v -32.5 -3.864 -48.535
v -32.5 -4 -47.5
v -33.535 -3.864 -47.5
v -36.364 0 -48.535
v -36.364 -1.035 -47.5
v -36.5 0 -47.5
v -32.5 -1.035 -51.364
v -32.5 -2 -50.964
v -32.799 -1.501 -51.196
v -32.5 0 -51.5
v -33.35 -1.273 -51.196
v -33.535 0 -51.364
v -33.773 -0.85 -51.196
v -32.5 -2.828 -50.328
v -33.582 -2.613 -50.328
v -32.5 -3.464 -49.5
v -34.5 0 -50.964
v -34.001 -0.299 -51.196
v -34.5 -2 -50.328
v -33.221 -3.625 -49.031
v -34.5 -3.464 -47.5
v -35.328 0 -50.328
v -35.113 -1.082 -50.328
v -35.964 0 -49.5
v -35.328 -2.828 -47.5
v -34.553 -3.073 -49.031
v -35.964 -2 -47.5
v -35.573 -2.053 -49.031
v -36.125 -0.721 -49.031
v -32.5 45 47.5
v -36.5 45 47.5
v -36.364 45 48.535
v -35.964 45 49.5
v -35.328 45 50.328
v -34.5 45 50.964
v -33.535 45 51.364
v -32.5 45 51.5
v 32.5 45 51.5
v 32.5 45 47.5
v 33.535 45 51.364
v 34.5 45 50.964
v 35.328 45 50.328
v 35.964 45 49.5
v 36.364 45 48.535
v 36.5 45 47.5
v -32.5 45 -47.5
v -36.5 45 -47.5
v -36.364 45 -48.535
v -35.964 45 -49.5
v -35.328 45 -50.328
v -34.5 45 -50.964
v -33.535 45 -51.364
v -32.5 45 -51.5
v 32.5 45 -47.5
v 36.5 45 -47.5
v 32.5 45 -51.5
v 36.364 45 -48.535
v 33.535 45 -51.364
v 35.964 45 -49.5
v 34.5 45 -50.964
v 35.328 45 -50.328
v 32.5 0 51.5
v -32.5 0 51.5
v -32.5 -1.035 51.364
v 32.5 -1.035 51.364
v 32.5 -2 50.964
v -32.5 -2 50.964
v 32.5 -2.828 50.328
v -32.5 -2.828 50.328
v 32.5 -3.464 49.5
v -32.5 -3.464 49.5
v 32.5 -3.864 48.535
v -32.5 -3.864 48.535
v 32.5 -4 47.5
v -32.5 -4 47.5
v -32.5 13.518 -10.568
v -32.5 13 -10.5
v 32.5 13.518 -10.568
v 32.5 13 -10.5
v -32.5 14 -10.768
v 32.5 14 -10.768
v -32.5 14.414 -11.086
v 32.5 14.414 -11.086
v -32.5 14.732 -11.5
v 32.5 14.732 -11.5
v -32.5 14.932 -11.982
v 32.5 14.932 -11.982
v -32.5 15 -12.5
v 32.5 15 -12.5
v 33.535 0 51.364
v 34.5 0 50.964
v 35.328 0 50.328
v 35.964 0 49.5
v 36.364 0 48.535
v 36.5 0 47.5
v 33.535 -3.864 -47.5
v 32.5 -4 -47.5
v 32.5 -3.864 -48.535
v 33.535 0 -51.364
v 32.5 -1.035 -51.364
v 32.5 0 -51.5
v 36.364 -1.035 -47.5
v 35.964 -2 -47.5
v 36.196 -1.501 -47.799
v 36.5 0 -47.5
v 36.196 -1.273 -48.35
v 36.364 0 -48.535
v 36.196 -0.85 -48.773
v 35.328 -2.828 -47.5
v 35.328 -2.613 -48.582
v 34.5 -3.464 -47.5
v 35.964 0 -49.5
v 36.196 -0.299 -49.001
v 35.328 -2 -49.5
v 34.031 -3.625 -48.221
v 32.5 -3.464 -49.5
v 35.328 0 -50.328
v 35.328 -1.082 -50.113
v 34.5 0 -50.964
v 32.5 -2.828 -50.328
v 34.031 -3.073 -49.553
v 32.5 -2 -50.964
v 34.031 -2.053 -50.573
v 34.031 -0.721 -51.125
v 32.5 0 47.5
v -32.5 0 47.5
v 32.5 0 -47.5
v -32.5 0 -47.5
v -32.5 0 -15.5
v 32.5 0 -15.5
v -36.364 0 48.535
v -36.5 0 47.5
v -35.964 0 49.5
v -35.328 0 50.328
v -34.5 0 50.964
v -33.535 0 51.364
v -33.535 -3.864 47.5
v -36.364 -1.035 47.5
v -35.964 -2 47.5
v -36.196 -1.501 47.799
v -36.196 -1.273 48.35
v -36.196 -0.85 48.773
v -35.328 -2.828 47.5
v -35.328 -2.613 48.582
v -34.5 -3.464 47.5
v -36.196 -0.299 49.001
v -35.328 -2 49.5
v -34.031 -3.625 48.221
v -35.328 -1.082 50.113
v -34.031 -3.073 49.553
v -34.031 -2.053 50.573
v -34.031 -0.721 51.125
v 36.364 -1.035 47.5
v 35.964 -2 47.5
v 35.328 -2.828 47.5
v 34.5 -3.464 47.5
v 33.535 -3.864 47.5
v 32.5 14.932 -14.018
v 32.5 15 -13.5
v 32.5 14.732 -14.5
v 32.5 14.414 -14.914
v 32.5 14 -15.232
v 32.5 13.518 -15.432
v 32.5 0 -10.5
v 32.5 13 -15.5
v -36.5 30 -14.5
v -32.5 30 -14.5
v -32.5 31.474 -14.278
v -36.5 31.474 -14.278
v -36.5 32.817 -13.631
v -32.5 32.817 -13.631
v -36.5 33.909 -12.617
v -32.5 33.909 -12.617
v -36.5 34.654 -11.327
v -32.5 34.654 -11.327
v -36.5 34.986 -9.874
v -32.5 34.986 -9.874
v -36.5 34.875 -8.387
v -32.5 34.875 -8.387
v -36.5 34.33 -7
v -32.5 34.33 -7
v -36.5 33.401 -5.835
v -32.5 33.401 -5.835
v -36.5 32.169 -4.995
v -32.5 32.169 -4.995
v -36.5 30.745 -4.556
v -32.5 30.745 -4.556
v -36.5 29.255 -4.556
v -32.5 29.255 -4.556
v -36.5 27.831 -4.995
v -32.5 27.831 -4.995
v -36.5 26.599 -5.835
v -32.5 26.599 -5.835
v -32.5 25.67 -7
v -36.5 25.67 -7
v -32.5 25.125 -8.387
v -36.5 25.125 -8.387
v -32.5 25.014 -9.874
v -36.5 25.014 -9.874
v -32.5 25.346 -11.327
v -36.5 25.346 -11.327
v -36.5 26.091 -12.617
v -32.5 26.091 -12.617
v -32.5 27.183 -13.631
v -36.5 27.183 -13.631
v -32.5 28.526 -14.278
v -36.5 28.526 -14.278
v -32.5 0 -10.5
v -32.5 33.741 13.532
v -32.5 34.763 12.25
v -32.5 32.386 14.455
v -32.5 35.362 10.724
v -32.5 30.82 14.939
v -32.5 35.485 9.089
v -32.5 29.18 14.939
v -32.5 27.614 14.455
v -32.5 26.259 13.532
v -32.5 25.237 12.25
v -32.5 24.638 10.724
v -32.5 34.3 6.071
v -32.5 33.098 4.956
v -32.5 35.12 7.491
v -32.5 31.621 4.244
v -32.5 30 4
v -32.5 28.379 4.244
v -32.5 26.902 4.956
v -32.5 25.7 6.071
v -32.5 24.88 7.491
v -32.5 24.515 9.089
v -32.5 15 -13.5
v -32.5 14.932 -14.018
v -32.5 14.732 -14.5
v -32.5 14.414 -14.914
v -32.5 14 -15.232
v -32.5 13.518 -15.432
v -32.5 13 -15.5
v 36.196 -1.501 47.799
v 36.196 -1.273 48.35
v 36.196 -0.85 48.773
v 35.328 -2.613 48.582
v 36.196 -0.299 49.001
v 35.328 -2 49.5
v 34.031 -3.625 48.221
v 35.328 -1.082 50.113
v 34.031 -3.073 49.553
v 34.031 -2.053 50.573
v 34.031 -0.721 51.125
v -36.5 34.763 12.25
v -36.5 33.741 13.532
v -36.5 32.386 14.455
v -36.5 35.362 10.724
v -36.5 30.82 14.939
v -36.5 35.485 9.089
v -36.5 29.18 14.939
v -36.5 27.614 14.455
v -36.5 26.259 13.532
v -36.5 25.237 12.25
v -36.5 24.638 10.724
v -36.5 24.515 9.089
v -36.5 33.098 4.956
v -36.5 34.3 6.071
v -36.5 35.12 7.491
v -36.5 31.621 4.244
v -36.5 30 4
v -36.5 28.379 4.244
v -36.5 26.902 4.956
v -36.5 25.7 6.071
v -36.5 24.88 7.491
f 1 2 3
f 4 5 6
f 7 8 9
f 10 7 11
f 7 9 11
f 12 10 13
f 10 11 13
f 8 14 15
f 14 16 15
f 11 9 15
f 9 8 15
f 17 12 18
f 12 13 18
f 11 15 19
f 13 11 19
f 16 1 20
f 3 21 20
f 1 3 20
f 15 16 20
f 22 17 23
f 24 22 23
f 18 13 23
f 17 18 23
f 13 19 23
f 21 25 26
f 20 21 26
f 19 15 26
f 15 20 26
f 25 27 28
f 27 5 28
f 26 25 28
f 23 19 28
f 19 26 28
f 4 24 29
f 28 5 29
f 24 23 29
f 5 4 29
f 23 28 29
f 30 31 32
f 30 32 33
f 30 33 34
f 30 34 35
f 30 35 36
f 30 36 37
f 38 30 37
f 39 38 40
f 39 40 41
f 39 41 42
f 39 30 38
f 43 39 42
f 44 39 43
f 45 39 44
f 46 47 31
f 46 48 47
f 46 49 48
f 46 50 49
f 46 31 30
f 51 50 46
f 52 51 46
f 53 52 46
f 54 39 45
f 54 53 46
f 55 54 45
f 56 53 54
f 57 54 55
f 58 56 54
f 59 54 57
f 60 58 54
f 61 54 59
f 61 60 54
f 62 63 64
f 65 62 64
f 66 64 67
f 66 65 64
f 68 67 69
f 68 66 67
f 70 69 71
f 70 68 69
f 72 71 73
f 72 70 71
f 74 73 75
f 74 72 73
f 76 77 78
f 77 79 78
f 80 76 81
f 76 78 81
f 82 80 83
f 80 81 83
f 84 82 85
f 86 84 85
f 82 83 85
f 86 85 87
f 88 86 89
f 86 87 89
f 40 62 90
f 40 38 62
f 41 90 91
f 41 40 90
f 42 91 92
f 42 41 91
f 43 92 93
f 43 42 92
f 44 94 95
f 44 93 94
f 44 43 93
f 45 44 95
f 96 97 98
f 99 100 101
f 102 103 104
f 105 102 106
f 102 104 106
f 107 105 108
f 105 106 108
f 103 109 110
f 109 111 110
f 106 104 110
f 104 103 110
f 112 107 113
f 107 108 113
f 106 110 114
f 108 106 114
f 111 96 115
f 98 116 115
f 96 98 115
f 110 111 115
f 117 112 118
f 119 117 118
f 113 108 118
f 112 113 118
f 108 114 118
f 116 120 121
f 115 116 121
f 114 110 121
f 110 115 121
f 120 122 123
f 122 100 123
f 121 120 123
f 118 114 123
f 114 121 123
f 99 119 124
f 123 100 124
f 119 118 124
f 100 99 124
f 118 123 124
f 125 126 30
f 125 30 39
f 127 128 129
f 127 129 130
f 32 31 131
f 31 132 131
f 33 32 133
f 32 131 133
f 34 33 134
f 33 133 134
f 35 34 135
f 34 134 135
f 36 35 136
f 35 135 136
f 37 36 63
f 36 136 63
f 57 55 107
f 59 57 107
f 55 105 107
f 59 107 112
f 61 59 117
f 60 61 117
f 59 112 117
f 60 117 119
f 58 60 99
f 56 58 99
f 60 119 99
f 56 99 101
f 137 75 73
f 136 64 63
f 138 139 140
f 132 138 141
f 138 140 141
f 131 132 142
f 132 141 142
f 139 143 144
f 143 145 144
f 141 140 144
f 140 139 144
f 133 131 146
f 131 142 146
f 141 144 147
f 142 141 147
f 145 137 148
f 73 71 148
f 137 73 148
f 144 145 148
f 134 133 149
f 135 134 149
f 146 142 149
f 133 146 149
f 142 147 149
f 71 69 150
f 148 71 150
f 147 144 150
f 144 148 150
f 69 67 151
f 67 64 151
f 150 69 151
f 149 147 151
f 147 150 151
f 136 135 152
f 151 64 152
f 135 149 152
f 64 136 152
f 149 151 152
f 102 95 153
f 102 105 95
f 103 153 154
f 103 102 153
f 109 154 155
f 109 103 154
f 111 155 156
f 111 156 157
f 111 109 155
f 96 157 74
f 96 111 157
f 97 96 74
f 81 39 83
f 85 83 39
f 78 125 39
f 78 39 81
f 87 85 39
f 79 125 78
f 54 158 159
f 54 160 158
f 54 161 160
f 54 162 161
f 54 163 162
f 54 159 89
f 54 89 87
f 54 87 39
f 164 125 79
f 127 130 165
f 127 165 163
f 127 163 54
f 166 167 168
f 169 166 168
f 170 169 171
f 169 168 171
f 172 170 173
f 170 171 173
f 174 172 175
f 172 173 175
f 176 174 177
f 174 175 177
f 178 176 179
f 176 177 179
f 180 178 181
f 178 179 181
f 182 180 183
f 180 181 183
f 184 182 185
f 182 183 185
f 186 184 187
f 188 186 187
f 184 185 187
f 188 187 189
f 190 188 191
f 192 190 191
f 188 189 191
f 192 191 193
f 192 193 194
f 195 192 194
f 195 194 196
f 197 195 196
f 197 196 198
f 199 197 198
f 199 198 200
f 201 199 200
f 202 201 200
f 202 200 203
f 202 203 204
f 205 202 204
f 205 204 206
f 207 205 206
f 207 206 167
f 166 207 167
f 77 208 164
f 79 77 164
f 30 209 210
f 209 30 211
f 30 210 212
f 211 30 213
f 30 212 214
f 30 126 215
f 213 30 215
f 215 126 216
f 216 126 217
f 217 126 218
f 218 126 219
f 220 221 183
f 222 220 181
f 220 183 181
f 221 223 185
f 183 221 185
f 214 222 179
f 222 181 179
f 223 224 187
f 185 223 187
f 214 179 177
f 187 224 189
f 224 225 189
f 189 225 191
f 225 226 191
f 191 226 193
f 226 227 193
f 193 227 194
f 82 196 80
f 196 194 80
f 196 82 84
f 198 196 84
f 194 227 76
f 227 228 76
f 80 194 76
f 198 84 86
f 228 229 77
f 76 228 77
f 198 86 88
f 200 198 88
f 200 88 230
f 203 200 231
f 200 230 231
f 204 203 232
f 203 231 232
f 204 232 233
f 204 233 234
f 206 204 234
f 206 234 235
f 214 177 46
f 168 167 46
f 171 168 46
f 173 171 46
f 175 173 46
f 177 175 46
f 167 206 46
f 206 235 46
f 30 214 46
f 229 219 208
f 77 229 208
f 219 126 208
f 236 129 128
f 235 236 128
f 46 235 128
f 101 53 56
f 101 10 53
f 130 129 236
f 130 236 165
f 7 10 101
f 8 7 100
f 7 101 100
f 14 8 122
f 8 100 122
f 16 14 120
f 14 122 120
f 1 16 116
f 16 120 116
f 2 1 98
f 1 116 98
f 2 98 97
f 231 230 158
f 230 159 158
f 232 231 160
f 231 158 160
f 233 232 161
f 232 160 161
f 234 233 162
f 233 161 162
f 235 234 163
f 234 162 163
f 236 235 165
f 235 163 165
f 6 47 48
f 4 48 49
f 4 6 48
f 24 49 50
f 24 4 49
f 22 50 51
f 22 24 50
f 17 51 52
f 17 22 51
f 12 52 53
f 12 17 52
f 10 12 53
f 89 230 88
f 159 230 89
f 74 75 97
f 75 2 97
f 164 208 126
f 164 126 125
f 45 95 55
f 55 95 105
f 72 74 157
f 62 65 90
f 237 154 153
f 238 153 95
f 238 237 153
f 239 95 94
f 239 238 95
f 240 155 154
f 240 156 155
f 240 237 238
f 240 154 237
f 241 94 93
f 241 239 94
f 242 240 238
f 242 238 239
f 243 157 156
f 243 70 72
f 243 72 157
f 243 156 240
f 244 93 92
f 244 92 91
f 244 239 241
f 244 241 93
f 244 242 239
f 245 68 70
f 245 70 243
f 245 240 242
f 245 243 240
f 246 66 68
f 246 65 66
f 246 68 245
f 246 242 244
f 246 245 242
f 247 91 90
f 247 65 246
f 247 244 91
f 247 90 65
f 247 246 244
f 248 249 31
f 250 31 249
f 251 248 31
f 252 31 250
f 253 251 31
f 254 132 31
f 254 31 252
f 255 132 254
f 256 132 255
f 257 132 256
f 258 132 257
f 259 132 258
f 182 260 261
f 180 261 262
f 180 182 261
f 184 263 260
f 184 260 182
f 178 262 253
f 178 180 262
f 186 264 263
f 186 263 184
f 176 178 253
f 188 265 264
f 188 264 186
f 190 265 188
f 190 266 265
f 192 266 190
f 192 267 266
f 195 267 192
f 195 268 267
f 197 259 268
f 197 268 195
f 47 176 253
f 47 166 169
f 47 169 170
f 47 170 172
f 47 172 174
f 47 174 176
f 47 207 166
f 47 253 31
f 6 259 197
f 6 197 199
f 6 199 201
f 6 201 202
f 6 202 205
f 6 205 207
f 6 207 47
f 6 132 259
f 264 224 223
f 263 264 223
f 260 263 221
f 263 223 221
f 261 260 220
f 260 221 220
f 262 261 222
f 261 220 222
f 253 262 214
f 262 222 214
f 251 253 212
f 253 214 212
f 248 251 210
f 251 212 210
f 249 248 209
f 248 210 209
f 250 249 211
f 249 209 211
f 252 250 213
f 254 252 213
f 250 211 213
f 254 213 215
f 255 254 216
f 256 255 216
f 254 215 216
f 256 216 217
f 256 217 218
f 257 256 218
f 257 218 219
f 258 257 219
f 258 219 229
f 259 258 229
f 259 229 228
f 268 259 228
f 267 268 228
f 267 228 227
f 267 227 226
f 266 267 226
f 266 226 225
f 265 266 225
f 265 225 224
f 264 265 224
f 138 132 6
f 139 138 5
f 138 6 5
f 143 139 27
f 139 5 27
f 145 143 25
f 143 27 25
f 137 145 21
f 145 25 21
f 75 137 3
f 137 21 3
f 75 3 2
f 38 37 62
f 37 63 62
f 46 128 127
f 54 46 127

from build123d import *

# Parameters (mm, degrees)
SKETCH1_W           = 65
SKETCH1_H           = 95
BOSS_EXTRUDE1_DEPTH = 45
SHELL4_T            = 4
SKETCH3_W           = 65
SKETCH3_H           = 5
BOSS_EXTRUDE3_DEPTH = 15
SKETCH4_R           = 5
SKETCH4_R_2         = 5.5
CUT_EXTRUDE1_DEPTH  = 5
FILLET1_R           = 4
FILLET2_R           = 2


with BuildPart() as part:
    # Sketch1 → Boss-Extrude1 (new body)
    with BuildSketch(Plane(origin=(0, 0, 0), x_dir=(1, 0, 0), z_dir=(0, 1, 0))):
        Rectangle(SKETCH1_W, SKETCH1_H)
    extrude(amount=BOSS_EXTRUDE1_DEPTH)

    # Shell4
    shell4_openings = [part.faces().sort_by_distance(p)[0] for p in [
        (0, 45, 0),
    ]]
    offset(amount=SHELL4_T, openings=shell4_openings, kind=Kind.INTERSECTION)

    # Sketch3 → Boss-Extrude3 (add)
    with BuildSketch(Plane(origin=(0, 0, 0), x_dir=(1, 0, 0), z_dir=(0, 1, 0))):
        with Locations((0, 13)):
            Rectangle(SKETCH3_W, SKETCH3_H)
    extrude(amount=BOSS_EXTRUDE3_DEPTH)

    # Sketch4 → Cut-Extrude1 (cut)
    with BuildSketch(Plane(origin=(-32.5, 0, 0), x_dir=(0, 0, -1), z_dir=(1, 0, 0))):
        with Locations((9.5, 30)):
            Circle(SKETCH4_R)
        with Locations((-9.5, 30)):
            Circle(SKETCH4_R_2)
    extrude(amount=-CUT_EXTRUDE1_DEPTH, mode=Mode.SUBTRACT)

    # Fillet1
    fillet1_edges = [part.edges().sort_by_distance(p)[0] for p in [
        (0, -4, 51.5),
        (-36.5, -4, 0),
        (0, -4, -51.5),
        (36.5, -4, 0),
        (36.5, 20.5, 51.5),
        (-36.5, 20.5, 51.5),
        (-36.5, 20.5, -51.5),
        (36.5, 20.5, -51.5),
    ]]
    fillet(fillet1_edges, radius=FILLET1_R)

    # Fillet2
    fillet2_edges = [part.edges().sort_by_distance(p)[0] for p in [
        (0, 15, -10.5),
        (0, 15, -15.5),
    ]]
    fillet(fillet2_edges, radius=FILLET2_R)


solid = part.part
